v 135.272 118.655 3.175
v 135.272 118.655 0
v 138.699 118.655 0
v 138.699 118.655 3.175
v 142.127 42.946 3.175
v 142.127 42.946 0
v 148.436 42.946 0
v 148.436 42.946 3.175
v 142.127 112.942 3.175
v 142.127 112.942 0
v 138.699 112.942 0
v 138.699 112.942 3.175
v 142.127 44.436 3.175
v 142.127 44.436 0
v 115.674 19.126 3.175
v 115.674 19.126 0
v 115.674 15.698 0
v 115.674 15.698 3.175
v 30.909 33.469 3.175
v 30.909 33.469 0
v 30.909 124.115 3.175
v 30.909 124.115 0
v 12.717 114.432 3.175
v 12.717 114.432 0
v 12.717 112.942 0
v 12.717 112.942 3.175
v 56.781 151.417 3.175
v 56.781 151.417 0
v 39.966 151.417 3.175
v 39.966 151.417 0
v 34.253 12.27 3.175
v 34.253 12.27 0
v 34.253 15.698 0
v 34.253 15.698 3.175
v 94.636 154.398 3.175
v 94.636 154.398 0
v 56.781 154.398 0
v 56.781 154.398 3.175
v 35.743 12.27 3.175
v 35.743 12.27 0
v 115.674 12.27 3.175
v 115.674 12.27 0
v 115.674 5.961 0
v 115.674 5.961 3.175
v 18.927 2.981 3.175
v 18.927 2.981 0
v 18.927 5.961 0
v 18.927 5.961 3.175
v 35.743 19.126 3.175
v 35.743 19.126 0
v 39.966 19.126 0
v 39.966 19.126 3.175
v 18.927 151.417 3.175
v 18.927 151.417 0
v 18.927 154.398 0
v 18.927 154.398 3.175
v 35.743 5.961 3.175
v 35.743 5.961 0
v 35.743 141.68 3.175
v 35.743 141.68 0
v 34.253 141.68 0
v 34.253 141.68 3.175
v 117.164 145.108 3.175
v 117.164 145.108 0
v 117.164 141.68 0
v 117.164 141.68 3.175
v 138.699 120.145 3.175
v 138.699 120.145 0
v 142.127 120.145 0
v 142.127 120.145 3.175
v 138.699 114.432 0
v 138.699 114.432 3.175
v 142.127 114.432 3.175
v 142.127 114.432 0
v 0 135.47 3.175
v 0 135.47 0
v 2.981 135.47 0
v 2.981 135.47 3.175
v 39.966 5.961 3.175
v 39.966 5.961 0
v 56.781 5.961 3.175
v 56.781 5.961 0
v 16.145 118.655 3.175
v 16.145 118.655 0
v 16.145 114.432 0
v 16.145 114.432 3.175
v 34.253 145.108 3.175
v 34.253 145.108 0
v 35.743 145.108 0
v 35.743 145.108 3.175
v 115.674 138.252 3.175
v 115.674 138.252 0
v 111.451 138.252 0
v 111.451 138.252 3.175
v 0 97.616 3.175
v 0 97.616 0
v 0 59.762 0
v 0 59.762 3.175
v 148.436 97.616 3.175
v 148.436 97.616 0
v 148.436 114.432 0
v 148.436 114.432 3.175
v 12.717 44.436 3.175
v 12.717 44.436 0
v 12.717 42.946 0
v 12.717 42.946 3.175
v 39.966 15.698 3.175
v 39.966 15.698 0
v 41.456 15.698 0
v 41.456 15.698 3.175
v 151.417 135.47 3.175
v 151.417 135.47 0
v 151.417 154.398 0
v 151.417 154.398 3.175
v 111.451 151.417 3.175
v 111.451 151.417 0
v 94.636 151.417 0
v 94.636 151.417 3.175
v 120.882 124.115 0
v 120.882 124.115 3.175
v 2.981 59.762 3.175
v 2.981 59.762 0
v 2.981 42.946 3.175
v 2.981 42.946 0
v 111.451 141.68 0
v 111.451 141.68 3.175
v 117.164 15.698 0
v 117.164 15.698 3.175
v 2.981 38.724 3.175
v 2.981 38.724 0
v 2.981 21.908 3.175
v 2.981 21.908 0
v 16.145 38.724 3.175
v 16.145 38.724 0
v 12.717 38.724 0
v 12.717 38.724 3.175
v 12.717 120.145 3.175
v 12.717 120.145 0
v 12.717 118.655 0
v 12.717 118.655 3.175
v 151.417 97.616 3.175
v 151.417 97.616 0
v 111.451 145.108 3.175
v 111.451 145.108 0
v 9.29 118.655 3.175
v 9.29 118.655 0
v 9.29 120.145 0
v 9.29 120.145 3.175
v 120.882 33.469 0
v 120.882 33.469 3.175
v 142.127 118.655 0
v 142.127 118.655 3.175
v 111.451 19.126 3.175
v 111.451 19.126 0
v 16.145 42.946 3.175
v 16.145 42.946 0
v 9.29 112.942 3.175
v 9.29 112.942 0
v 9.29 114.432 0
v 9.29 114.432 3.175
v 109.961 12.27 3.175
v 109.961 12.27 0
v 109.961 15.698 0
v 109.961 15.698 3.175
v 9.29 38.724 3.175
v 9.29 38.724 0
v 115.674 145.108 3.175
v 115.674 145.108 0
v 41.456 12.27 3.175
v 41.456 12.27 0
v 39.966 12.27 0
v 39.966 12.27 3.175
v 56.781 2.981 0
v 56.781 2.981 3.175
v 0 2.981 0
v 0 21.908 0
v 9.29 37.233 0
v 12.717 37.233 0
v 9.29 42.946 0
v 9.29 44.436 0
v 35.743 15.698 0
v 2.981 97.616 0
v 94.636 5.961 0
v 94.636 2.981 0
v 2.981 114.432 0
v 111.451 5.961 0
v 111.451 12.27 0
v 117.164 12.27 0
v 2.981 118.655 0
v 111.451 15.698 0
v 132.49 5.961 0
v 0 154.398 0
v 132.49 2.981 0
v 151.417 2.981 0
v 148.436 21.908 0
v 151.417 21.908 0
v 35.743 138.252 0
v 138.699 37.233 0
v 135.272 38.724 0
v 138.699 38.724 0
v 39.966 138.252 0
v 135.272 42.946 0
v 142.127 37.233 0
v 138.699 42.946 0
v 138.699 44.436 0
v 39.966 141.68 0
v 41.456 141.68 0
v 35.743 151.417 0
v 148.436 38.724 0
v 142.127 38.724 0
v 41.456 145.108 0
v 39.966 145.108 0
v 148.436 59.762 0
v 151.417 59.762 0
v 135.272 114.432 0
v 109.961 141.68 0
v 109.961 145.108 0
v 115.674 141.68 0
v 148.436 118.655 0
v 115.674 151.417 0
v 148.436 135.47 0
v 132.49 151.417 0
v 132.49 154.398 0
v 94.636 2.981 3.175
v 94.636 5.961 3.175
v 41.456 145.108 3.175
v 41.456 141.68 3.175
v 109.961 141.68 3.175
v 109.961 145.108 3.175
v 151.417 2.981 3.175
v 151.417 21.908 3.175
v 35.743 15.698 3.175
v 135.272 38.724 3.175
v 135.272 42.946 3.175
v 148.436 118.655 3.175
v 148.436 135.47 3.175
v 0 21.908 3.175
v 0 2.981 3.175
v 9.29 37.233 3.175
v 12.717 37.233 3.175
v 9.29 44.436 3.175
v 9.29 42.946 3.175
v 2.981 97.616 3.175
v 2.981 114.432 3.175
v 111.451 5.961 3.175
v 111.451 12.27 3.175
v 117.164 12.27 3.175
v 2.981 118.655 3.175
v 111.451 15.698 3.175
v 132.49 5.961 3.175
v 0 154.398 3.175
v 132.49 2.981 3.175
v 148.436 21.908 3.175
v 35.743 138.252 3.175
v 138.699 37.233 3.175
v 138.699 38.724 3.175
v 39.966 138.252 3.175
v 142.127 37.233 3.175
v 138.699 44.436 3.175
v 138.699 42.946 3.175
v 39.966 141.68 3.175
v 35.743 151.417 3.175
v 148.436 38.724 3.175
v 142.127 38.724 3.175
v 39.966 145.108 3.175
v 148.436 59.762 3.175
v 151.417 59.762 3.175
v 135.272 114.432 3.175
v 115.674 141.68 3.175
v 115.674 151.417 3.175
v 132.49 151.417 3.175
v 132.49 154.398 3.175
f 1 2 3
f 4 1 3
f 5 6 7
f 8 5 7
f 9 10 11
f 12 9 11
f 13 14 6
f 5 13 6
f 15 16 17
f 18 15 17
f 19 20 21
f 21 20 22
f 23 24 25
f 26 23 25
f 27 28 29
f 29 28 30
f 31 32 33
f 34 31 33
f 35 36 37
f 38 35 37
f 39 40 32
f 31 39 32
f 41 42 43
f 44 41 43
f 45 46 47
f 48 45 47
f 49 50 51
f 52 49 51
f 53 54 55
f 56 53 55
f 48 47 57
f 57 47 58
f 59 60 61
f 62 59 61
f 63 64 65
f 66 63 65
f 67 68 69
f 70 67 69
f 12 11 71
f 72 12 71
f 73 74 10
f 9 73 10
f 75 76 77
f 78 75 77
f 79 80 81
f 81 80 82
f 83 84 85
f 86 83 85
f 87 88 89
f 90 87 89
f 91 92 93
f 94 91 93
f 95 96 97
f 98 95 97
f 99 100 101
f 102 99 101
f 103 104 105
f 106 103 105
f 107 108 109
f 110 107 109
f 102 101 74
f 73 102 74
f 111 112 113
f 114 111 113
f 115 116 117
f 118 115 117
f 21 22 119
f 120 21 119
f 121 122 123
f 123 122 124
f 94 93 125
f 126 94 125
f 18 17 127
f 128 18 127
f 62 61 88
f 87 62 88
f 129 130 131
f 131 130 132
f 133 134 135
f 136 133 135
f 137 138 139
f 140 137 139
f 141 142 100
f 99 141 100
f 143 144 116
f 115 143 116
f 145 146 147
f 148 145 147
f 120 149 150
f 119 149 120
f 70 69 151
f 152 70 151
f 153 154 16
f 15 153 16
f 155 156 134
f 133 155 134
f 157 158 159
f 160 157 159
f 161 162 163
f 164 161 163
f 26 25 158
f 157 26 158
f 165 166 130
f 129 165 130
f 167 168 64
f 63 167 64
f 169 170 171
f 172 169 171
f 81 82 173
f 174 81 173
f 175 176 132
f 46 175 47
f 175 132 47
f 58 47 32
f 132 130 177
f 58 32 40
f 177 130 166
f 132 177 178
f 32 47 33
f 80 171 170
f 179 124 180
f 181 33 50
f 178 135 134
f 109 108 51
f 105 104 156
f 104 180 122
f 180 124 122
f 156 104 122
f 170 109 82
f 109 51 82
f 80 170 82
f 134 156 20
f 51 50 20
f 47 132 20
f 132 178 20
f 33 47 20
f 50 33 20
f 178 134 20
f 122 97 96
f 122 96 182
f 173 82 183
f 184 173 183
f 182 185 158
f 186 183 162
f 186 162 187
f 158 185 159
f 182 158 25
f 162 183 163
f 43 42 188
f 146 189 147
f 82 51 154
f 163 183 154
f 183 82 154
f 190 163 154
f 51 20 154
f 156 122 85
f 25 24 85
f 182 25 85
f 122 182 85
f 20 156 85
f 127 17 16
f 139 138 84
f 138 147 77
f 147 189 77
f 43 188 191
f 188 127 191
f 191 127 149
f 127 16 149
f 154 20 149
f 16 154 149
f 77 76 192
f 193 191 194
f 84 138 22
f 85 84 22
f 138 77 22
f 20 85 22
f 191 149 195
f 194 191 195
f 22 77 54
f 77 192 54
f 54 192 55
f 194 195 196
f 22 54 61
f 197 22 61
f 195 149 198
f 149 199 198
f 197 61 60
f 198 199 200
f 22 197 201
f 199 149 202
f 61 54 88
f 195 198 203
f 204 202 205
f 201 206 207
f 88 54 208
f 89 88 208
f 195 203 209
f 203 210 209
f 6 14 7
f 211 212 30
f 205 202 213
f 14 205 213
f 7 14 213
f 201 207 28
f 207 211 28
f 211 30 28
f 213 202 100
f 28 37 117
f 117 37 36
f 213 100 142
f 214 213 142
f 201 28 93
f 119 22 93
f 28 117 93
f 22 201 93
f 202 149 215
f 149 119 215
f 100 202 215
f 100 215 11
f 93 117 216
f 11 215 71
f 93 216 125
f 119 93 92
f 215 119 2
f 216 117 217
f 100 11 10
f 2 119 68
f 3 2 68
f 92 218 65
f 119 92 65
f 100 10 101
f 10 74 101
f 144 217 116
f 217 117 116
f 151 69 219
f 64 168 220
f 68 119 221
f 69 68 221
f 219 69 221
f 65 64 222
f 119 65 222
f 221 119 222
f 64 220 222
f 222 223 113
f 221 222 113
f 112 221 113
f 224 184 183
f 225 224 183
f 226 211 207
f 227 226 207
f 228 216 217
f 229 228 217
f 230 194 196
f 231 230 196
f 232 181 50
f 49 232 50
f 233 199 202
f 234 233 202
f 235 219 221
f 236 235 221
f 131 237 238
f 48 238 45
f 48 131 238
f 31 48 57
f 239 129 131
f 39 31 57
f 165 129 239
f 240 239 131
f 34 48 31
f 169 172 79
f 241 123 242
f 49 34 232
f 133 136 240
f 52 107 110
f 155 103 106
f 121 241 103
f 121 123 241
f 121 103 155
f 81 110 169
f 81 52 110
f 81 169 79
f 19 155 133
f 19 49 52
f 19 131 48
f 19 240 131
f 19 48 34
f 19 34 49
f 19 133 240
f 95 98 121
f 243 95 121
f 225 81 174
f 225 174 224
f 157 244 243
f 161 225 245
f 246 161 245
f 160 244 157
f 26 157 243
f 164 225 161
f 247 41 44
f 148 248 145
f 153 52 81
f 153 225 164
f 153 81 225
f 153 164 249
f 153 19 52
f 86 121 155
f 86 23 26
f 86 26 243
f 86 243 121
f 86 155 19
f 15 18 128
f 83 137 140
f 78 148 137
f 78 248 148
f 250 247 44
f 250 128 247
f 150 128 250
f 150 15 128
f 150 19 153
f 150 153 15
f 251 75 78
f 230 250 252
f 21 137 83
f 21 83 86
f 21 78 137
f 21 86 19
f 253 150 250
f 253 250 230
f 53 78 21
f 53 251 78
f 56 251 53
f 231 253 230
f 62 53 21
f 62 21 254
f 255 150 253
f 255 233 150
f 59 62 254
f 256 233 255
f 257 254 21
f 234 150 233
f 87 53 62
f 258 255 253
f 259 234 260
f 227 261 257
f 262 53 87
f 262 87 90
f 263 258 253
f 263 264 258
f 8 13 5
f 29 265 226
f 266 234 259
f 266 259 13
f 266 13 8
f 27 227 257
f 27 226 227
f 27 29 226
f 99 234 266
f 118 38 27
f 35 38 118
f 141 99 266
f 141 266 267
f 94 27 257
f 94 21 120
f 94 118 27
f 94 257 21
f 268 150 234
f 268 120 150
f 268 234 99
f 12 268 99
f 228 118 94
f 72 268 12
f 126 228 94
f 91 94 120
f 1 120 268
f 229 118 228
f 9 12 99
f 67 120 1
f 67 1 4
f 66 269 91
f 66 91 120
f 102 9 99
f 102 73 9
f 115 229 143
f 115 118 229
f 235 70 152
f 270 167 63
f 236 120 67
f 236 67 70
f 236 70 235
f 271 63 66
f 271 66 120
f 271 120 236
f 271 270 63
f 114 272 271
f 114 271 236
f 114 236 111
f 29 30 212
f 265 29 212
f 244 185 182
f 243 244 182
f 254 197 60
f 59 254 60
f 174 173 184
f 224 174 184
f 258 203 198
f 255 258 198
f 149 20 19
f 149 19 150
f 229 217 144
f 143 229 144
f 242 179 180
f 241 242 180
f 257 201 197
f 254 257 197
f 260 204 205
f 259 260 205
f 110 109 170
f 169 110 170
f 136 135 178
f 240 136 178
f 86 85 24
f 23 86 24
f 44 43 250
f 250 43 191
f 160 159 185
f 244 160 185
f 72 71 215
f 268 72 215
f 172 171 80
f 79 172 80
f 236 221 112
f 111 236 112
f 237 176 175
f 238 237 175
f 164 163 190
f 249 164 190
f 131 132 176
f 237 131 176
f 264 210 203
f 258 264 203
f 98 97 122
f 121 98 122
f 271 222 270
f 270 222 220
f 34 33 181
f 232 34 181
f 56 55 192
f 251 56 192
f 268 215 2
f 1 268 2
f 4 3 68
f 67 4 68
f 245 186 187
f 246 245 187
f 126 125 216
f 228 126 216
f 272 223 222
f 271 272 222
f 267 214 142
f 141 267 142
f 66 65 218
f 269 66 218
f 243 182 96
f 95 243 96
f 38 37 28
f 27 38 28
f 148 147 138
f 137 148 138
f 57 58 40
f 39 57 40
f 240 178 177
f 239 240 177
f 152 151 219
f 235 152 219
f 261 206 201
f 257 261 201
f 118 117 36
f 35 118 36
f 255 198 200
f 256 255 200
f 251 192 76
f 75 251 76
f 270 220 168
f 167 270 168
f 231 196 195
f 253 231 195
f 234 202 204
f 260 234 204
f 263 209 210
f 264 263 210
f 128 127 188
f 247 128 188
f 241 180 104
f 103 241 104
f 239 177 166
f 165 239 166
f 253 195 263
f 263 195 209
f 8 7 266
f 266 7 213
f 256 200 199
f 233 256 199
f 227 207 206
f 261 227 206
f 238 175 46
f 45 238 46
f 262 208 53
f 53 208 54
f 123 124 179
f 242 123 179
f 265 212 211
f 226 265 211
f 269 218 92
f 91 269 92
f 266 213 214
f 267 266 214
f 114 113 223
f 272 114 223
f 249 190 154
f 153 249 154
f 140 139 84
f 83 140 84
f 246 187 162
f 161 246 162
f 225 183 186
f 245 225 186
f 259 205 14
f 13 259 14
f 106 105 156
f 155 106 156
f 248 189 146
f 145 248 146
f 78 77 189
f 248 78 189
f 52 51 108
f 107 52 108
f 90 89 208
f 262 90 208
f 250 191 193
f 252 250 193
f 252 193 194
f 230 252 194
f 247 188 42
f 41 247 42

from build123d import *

# Parameters (mm, degrees)
SKETCH1_W           = 89.973098965
SKETCH1_H           = 90.646237782
BOSS_EXTRUDE1_DEPTH = 3.175


with BuildPart() as part:
    # Sketch1 → Boss-Extrude1 (new body)
    with BuildSketch(Plane.XY):
        Polygon((0, 154.39750188), (0, 135.470394989), (2.980646754, 135.470394989), (2.980646754, 118.65457955), (9.289682385, 118.65457955), (9.289682385, 120.144902927), (12.717426152, 120.144902927), (12.717426152, 118.65457955), (16.14516992, 118.65457955), (16.14516992, 114.431996648), (12.717426152, 114.431996648), (12.717426152, 112.94167327), (9.289682385, 112.94167327), (9.289682385, 114.431996648), (2.980646754, 114.431996648), (2.980646754, 97.616181208), (0, 97.616181208), (0, 59.761967427), (2.980646754, 59.761967427), (2.980646754, 42.946151987), (9.289682385, 42.946151987), (9.289682385, 44.436475364), (12.717426152, 44.436475364), (12.717426152, 42.946151987), (16.14516992, 42.946151987), (16.14516992, 38.723569085), (12.717426152, 38.723569085), (12.717426152, 37.233245708), (9.289682385, 37.233245708), (9.289682385, 38.723569085), (2.980646754, 38.723569085), (2.980646754, 21.907753645), (0, 21.907753645), (0, 2.980646754), (18.927106891, 2.980646754), (18.927106891, 5.961293509), (35.74292233, 5.961293509), (35.74292233, 12.270329139), (34.252598953, 12.270329139), (34.252598953, 15.698072907), (35.74292233, 15.698072907), (35.74292233, 19.125816674), (39.965505232, 19.125816674), (39.965505232, 15.698072907), (41.45582861, 15.698072907), (41.45582861, 12.270329139), (39.965505232, 12.270329139), (39.965505232, 5.961293509), (56.781320672, 5.961293509), (56.781320672, 2.980646754), (94.635534454, 2.980646754), (94.635534454, 5.961293509), (111.451349893, 5.961293509), (111.451349893, 12.270329139), (109.961026516, 12.270329139), (109.961026516, 15.698072907), (111.451349893, 15.698072907), (111.451349893, 19.125816674), (115.673932795, 19.125816674), (115.673932795, 15.698072907), (117.164256172, 15.698072907), (117.164256172, 12.270329139), (115.673932795, 12.270329139), (115.673932795, 5.961293509), (132.489748235, 5.961293509), (132.489748235, 2.980646754), (151.416855126, 2.980646754), (151.416855126, 21.907753645), (148.436208371, 21.907753645), (148.436208371, 38.723569085), (142.127172741, 38.723569085), (142.127172741, 37.233245708), (138.699428973, 37.233245708), (138.699428973, 38.723569085), (135.271685206, 38.723569085), (135.271685206, 42.946151987), (138.699428973, 42.946151987), (138.699428973, 44.436475364), (142.127172741, 44.436475364), (142.127172741, 42.946151987), (148.436208371, 42.946151987), (148.436208371, 59.761967427), (151.416855126, 59.761967427), (151.416855126, 97.616181208), (148.436208371, 97.616181208), (148.436208371, 114.431996648), (142.127172741, 114.431996648), (142.127172741, 112.94167327), (138.699428973, 112.94167327), (138.699428973, 114.431996648), (135.271685206, 114.431996648), (135.271685206, 118.65457955), (138.699428973, 118.65457955), (138.699428973, 120.144902927), (142.127172741, 120.144902927), (142.127172741, 118.65457955), (148.436208371, 118.65457955), (148.436208371, 135.470394989), (151.416855126, 135.470394989), (151.416855126, 154.39750188), (132.489748235, 154.39750188), (132.489748235, 151.416855126), (115.673932795, 151.416855126), (115.673932795, 145.107819495), (117.164256172, 145.107819495), (117.164256172, 141.680075728), (115.673932795, 141.680075728), (115.673932795, 138.25233196), (111.451349893, 138.25233196), (111.451349893, 141.680075728), (109.961026516, 141.680075728), (109.961026516, 145.107819495), (111.451349893, 145.107819495), (111.451349893, 151.416855126), (94.635534454, 151.416855126), (94.635534454, 154.39750188), (56.781320672, 154.39750188), (56.781320672, 151.416855126), (39.965505232, 151.416855126), (39.965505232, 145.107819495), (41.45582861, 145.107819495), (41.45582861, 141.680075728), (39.965505232, 141.680075728), (39.965505232, 138.25233196), (35.74292233, 138.25233196), (35.74292233, 141.680075728), (34.252598953, 141.680075728), (34.252598953, 145.107819495), (35.74292233, 145.107819495), (35.74292233, 151.416855126), (18.927106891, 151.416855126), (18.927106891, 154.39750188), align=None)
        with Locations((75.89557754, 78.791987571)):
            Rectangle(SKETCH1_W, SKETCH1_H, mode=Mode.SUBTRACT)
    extrude(amount=BOSS_EXTRUDE1_DEPTH)


solid = part.part
